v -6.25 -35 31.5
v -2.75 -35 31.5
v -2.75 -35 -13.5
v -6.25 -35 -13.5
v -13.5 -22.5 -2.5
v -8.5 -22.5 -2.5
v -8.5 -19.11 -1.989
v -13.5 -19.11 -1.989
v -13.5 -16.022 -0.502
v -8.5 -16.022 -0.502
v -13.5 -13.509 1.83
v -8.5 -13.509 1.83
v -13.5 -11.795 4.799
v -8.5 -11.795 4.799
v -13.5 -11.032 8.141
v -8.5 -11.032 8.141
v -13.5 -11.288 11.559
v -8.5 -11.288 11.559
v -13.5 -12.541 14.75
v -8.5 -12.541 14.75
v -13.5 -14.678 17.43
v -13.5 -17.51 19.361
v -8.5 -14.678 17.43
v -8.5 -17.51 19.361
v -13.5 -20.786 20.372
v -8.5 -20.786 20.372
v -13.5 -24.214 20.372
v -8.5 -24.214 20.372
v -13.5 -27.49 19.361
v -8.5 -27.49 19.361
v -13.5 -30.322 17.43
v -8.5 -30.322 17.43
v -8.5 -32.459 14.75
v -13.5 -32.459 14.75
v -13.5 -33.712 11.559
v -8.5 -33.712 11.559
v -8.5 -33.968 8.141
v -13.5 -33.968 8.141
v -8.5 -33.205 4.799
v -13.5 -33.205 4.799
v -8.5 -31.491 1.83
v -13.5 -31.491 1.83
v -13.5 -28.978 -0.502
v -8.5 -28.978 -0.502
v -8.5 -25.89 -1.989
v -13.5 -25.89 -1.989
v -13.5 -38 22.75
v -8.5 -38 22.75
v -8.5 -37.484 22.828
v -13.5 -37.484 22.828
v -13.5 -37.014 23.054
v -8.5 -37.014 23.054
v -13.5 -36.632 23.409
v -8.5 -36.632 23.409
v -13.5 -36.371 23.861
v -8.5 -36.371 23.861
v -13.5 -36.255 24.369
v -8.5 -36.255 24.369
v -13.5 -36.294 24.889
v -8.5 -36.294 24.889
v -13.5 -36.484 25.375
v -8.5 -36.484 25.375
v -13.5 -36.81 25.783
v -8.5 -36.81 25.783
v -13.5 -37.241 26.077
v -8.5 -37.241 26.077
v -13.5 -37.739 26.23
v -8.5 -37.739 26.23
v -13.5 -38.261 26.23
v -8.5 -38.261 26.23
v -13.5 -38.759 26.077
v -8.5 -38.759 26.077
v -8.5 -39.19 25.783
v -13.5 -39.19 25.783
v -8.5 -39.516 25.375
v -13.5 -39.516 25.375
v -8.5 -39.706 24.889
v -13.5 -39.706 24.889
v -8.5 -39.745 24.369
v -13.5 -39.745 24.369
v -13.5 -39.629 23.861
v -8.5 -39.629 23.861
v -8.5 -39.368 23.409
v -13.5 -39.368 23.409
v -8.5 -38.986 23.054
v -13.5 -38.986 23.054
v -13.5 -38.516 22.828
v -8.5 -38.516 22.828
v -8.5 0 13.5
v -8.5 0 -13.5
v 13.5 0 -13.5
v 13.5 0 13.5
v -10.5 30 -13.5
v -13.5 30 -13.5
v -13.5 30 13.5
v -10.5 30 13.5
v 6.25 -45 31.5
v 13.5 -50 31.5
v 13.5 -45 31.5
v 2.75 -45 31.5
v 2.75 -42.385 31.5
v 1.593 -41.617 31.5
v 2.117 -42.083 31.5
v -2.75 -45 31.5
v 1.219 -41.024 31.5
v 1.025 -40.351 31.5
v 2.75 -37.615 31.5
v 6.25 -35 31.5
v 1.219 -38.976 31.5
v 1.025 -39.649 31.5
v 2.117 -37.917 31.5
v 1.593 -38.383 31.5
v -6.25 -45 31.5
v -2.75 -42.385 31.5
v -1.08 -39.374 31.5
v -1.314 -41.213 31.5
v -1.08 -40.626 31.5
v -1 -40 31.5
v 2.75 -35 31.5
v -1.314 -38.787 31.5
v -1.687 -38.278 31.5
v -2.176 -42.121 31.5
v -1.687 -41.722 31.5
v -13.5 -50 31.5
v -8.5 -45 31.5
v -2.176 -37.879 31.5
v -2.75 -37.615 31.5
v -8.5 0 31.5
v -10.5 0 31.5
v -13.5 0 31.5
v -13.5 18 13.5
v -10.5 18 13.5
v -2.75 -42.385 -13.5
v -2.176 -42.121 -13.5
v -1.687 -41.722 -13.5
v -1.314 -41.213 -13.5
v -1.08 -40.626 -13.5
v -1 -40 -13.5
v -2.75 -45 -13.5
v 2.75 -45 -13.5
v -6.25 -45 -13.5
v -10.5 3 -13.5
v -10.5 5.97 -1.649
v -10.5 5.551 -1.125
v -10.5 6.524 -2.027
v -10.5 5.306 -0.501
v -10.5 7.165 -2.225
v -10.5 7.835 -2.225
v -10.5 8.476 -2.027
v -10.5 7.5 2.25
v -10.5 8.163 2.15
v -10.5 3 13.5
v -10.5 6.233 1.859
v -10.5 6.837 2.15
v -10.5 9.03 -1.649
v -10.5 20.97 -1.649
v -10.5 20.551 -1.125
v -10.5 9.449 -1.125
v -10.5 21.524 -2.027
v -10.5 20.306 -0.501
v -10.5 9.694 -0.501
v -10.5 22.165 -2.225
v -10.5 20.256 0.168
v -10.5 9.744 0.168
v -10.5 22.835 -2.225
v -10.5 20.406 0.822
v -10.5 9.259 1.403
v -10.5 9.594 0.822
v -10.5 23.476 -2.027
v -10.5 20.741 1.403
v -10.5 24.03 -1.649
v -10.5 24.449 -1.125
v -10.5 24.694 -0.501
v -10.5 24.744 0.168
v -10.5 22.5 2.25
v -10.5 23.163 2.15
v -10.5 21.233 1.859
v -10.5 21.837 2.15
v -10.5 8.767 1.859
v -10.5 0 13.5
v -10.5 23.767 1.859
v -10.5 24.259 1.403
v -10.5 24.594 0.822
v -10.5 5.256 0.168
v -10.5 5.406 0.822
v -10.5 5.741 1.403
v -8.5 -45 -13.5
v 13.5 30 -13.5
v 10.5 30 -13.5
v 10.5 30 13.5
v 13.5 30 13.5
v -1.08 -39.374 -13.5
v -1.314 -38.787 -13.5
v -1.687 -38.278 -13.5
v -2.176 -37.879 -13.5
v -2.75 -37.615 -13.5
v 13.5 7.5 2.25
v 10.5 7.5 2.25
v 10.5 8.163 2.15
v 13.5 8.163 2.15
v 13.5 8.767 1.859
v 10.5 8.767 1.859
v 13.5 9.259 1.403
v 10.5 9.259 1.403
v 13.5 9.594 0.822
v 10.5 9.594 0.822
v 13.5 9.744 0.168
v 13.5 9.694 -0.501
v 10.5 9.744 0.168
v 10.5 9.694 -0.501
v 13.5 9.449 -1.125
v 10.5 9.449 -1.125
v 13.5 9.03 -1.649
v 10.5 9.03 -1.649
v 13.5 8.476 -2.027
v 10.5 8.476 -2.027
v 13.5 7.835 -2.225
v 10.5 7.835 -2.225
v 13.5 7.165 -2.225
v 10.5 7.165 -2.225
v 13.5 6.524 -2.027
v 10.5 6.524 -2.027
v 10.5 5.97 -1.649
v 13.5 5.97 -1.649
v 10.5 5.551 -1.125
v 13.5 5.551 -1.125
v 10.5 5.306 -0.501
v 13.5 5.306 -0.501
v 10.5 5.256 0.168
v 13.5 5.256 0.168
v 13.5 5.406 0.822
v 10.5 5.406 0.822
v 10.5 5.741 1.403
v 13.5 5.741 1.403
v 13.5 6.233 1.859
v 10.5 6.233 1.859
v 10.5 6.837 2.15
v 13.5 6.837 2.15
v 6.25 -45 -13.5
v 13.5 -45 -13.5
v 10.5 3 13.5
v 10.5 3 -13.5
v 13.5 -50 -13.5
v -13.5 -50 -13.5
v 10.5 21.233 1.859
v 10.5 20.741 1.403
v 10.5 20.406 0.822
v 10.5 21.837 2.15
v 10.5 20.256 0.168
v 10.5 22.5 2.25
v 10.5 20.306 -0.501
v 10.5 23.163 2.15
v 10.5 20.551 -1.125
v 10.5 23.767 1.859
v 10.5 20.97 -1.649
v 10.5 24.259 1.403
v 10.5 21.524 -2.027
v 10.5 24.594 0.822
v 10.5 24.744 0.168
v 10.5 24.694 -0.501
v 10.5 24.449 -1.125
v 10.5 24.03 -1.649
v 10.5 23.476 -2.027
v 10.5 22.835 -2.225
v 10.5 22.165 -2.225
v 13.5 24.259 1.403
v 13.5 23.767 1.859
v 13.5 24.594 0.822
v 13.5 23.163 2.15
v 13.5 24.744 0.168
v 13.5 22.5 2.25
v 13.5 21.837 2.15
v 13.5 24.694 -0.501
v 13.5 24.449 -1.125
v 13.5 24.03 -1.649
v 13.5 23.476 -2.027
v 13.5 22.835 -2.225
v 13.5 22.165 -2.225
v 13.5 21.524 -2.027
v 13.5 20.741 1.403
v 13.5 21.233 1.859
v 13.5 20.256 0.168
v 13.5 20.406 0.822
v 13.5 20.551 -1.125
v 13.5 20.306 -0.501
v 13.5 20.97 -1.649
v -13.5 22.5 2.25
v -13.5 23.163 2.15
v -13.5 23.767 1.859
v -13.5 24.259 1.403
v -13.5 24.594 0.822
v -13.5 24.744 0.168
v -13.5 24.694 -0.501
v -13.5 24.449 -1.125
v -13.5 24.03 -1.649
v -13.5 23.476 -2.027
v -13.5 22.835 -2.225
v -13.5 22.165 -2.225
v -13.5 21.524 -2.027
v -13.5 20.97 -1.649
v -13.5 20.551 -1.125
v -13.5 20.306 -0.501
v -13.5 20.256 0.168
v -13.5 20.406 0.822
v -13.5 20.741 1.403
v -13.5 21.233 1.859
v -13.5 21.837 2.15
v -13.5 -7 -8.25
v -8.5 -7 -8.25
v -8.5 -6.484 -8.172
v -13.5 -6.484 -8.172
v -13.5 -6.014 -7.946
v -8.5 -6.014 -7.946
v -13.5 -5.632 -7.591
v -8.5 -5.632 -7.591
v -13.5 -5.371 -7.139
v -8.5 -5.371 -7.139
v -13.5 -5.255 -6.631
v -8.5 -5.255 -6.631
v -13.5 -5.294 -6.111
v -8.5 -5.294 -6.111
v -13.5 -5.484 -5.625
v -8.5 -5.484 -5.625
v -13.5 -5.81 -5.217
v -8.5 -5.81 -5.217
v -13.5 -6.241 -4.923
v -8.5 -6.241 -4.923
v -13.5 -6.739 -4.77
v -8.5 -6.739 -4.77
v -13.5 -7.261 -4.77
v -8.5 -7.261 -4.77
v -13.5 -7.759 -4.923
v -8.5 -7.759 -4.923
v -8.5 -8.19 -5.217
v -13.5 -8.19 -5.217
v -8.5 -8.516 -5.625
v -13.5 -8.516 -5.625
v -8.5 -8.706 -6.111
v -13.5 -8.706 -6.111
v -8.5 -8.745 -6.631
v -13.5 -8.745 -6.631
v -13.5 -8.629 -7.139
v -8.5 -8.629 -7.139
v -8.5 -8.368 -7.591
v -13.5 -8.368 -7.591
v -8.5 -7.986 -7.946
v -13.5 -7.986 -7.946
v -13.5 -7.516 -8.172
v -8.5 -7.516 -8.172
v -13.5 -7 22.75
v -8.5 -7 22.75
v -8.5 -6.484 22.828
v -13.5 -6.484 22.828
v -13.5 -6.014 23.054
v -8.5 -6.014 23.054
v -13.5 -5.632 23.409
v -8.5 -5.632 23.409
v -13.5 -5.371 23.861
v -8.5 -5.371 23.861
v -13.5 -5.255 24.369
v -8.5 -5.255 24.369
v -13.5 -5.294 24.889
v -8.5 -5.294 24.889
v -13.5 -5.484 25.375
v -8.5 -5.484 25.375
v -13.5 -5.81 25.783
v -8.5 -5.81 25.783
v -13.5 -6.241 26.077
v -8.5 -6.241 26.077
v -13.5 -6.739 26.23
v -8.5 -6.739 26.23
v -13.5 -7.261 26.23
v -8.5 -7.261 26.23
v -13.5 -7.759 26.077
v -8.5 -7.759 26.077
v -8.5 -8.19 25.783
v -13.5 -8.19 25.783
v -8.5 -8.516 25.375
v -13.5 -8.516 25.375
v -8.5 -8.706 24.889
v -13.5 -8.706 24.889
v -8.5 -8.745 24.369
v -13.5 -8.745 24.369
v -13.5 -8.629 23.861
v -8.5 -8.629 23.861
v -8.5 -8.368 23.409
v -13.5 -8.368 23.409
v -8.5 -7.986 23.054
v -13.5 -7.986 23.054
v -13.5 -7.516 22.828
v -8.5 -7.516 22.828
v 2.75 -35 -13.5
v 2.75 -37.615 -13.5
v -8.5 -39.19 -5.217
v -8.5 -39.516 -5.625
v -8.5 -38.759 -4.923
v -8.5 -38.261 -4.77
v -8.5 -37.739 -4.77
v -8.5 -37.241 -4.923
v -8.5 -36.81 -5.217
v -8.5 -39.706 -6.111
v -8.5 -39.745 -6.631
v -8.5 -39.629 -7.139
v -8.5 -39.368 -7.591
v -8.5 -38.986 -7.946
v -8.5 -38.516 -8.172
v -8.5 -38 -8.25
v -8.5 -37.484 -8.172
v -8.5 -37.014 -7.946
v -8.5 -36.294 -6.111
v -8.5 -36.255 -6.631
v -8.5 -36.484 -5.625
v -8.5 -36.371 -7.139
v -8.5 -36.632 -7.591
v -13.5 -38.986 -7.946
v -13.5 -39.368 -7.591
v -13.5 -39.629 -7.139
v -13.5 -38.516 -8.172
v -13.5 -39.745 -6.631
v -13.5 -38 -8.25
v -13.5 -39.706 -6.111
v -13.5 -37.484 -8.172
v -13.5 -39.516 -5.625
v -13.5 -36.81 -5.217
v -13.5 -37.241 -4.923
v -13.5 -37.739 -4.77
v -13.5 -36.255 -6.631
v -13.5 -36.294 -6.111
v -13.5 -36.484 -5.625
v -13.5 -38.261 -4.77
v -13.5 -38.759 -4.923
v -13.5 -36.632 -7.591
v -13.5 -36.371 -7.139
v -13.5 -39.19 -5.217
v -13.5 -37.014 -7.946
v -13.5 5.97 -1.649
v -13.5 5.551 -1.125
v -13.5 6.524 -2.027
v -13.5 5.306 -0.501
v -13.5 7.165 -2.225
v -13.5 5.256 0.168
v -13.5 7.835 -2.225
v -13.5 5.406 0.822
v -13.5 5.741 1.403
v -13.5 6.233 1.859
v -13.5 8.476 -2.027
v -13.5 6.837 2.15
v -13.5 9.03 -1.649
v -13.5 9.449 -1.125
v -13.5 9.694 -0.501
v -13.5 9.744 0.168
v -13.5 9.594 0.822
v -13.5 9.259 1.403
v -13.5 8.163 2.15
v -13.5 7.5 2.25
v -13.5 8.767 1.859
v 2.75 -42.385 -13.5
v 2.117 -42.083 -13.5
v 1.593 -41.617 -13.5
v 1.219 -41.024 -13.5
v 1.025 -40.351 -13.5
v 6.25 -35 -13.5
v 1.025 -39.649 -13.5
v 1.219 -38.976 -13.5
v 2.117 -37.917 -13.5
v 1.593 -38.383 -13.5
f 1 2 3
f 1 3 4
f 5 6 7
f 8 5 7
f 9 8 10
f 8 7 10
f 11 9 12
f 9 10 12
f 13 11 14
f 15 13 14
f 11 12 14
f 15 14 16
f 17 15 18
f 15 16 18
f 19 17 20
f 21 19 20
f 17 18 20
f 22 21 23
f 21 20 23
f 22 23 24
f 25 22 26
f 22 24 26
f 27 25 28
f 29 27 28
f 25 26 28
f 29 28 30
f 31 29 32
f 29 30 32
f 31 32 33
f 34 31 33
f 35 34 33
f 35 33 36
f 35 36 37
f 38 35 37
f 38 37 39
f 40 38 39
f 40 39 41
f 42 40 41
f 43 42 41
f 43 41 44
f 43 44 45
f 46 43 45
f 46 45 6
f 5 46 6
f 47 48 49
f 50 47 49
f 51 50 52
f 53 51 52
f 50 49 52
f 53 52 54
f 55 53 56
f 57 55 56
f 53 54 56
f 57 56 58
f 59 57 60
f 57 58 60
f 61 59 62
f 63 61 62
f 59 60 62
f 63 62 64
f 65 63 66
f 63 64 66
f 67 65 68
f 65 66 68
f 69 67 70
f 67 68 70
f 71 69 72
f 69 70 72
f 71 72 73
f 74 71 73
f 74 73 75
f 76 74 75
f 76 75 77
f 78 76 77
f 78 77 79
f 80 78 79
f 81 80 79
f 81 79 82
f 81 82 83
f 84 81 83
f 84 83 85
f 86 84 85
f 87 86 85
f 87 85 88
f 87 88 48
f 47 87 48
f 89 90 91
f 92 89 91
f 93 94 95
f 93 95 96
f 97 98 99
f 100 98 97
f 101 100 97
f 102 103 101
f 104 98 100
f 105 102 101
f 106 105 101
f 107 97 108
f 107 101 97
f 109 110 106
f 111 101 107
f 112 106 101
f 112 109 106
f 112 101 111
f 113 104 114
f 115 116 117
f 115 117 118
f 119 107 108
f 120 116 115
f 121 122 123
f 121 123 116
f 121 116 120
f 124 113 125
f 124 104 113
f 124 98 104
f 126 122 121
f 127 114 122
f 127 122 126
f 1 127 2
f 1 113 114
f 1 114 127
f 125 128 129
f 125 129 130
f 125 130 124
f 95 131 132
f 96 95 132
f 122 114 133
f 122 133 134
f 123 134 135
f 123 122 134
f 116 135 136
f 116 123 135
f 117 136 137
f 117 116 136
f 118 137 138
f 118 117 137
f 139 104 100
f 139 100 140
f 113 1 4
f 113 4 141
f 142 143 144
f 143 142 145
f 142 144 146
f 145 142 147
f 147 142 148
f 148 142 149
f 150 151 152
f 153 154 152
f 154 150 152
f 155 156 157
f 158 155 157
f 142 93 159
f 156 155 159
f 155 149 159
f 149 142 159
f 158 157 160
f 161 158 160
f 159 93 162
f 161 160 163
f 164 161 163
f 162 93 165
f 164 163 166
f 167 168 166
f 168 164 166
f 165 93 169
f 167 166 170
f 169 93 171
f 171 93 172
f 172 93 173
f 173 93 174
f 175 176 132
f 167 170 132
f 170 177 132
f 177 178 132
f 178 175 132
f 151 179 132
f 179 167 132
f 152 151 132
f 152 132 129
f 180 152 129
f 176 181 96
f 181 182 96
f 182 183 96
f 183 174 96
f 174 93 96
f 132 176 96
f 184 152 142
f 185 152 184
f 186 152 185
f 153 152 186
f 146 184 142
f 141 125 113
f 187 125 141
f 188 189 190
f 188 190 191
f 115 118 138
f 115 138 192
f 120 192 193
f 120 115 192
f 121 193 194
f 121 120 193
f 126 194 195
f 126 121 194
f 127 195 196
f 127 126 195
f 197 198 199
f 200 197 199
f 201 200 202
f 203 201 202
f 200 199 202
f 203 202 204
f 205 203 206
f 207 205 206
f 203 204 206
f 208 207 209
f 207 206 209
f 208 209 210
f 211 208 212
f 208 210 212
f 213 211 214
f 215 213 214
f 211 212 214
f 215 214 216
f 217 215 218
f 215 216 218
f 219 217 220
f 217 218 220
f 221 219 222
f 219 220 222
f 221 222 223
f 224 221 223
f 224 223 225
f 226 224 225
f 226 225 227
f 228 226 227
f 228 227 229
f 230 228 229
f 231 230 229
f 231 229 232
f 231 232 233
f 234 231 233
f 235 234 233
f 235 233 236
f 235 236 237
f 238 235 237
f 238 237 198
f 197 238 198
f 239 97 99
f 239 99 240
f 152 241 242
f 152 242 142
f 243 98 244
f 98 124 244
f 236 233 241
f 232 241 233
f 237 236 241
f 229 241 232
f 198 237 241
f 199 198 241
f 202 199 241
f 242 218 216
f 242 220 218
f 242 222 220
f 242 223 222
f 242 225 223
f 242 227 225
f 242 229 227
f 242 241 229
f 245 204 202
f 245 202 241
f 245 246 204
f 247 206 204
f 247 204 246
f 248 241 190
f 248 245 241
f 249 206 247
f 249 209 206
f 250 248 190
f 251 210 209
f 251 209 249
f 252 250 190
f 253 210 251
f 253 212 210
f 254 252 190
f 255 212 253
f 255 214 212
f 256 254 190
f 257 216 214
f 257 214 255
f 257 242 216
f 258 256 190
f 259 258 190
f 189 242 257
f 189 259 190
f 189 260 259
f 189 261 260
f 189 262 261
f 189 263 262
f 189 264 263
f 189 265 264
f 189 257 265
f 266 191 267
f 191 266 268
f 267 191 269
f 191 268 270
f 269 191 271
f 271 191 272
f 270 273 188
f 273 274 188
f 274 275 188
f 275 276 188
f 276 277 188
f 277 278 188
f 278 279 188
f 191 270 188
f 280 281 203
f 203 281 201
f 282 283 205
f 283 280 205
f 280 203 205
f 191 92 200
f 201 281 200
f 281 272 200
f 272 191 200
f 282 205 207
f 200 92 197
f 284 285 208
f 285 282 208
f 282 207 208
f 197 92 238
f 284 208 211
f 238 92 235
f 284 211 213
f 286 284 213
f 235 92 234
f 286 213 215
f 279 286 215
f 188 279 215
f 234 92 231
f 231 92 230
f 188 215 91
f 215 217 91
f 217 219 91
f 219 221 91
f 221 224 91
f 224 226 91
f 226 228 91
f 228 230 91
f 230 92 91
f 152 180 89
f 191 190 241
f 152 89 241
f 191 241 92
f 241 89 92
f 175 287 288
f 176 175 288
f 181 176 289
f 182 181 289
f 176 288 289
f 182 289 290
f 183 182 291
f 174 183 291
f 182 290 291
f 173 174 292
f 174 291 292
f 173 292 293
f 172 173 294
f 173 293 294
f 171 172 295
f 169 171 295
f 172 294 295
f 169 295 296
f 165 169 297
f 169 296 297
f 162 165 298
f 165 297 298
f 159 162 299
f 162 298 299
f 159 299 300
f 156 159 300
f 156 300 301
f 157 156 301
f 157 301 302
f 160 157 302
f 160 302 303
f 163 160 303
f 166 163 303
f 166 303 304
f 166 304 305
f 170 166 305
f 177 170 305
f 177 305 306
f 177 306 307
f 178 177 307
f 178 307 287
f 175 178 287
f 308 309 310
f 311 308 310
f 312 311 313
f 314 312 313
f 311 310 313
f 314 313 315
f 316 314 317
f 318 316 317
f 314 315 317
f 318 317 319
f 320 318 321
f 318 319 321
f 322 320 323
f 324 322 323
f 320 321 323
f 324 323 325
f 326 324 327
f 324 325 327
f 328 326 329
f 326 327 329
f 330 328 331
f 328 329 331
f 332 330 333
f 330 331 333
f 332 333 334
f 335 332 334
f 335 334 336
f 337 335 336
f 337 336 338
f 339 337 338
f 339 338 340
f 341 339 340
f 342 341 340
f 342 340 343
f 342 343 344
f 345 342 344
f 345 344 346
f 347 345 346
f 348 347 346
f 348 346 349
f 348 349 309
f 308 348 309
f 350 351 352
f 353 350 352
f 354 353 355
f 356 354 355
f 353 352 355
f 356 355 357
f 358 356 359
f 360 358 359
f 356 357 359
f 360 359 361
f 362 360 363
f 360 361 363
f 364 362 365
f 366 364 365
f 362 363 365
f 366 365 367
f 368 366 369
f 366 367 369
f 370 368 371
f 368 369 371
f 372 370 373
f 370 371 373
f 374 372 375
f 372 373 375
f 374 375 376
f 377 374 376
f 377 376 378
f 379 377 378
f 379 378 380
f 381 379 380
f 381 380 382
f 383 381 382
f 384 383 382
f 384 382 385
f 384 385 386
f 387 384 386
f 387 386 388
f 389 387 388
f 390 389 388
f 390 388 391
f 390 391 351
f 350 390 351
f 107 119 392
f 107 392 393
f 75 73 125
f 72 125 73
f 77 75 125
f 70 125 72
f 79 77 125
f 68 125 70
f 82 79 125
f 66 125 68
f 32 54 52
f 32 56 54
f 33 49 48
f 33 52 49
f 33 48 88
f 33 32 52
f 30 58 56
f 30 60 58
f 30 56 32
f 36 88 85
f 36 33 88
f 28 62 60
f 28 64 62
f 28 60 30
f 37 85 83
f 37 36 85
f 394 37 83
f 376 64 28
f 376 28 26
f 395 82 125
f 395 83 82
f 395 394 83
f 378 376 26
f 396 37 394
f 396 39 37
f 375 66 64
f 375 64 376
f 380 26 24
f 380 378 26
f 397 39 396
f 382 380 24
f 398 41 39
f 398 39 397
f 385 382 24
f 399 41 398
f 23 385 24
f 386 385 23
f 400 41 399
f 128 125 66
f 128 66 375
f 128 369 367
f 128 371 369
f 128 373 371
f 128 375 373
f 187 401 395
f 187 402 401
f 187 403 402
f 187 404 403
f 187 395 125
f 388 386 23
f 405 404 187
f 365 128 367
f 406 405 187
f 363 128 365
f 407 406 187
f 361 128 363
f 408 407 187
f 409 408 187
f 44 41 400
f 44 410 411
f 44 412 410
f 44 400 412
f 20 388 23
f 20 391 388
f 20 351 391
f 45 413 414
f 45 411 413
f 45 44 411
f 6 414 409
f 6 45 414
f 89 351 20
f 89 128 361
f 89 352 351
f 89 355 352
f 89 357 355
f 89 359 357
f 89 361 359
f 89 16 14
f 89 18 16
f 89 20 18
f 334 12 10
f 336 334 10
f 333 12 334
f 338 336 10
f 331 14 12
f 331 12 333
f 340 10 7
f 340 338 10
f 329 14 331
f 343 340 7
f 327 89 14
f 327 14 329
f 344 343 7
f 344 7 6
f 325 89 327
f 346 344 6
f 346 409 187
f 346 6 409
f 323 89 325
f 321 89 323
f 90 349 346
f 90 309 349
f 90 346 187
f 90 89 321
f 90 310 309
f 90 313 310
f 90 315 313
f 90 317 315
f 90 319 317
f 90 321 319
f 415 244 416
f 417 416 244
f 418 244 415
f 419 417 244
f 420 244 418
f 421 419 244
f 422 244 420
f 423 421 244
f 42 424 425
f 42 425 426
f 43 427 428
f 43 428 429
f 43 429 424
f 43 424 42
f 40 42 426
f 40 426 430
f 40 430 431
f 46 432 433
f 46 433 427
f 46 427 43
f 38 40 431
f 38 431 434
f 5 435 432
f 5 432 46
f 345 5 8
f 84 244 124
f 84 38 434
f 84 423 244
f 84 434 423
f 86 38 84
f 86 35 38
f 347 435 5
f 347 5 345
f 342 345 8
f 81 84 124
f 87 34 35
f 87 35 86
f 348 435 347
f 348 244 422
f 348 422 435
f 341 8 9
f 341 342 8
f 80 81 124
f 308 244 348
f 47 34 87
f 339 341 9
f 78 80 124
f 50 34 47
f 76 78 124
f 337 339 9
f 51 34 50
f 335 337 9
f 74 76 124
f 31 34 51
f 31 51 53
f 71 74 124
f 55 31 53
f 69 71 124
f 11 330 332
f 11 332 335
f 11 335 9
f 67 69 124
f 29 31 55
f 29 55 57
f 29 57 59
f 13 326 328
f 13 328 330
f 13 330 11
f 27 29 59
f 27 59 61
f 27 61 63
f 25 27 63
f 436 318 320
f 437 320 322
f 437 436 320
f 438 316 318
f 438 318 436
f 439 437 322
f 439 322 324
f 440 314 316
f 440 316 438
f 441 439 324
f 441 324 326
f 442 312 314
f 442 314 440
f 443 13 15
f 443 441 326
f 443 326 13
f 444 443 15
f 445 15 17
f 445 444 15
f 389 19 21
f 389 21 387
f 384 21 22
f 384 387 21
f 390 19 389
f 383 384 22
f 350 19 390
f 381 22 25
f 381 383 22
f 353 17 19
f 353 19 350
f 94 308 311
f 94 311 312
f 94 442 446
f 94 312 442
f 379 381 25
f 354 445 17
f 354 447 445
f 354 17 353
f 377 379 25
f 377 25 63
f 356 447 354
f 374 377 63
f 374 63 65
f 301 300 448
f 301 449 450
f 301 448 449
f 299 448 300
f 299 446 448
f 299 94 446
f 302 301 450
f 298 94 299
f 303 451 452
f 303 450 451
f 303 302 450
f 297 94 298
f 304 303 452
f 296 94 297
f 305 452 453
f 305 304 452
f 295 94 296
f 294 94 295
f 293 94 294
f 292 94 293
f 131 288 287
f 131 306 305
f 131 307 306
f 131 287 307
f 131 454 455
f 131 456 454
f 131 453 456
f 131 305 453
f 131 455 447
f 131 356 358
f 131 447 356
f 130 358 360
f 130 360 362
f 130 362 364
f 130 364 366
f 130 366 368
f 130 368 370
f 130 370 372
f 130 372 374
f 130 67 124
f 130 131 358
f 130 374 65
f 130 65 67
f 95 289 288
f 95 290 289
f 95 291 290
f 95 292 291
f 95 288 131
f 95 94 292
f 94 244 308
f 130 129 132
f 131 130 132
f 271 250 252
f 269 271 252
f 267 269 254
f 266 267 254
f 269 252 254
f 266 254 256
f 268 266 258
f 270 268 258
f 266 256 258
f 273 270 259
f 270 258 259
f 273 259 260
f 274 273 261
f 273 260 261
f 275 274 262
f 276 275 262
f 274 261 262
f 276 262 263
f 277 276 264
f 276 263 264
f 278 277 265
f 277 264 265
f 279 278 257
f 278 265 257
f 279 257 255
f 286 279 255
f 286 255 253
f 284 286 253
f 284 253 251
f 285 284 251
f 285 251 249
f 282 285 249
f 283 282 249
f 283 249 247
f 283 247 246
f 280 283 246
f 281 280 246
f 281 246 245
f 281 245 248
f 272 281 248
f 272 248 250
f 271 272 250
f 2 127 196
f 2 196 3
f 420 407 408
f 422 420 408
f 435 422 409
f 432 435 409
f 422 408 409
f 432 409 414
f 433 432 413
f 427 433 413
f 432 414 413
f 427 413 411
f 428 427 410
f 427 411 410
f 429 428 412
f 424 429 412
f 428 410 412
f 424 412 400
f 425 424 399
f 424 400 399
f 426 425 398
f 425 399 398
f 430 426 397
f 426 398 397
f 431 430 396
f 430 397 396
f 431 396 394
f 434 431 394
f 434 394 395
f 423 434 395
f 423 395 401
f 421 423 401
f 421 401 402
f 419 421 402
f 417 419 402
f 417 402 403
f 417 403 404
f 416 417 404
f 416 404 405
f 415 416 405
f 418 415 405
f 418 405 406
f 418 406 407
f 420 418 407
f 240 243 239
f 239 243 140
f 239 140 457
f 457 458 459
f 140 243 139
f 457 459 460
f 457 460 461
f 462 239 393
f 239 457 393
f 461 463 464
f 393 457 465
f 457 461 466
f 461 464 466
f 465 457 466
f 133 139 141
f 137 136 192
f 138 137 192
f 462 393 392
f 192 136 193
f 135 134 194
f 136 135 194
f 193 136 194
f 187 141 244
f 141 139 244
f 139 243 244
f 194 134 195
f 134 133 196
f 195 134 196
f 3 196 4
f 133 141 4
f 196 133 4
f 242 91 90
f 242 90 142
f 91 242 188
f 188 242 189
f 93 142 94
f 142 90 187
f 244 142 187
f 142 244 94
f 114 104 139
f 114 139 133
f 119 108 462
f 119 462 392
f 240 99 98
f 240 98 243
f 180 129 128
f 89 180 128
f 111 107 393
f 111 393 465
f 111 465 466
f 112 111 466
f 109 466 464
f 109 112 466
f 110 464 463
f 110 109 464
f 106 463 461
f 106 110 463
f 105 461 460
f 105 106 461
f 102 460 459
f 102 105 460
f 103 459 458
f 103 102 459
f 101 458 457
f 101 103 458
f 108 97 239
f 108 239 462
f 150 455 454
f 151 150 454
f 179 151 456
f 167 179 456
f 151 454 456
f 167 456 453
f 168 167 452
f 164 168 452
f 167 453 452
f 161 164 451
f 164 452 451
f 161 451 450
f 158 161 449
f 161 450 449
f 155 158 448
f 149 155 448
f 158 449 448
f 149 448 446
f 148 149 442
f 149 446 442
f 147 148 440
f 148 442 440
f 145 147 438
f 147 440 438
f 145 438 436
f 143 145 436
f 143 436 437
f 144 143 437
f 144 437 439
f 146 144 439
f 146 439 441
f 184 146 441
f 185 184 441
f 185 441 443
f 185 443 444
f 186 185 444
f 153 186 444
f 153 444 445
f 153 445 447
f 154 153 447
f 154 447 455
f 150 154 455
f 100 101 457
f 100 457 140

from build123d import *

# Parameters (mm, degrees)
SKETCH1_W            = 27
SKETCH1_H            = 27
BOSS_EXTRUDE1_DEPTH  = 30
SKETCH2_W            = 21
SKETCH2_H            = 27
CUT_EXTRUDE1_DEPTH   = 30
SKETCH3_R            = 2.25
CUT_EXTRUDE2_DEPTH   = 30
SKETCH5_W            = 5
SKETCH5_H            = 45
BOSS_EXTRUDE2_DEPTH  = 45
SKETCH6_R            = 1.75
SKETCH6_R_2          = 11.5
CUT_EXTRUDE3_DEPTH   = 10
SKETCH8_W            = 45
SKETCH8_H            = 5
BOSS_EXTRUDE4_DEPTH  = 5
SKETCH9_W            = 45
SKETCH9_H            = 5
BOSS_EXTRUDE5_DEPTH  = 22
BOSS_EXTRUDE6_DEPTH  = 45
BOSS_EXTRUDE10_START = -3
BOSS_EXTRUDE10_DEPTH = 3


with BuildPart() as part:
    # Sketch1 → Boss-Extrude1 (new body)
    with BuildSketch(Plane(origin=(0, 0, 0), x_dir=(1, 0, 0), z_dir=(0, 1, 0))):
        Rectangle(SKETCH1_W, SKETCH1_H)
    extrude(amount=BOSS_EXTRUDE1_DEPTH)

    # Sketch2 → Cut-Extrude1 (cut)
    with BuildSketch(Plane(origin=(0, 0, -13.5), x_dir=(-1, 0, 0), z_dir=(0, 0, -1))):
        with Locations((0, 16.5)):
            Rectangle(SKETCH2_W, SKETCH2_H)
    extrude(amount=-CUT_EXTRUDE1_DEPTH, mode=Mode.SUBTRACT)

    # Sketch3 → Cut-Extrude2 (cut)
    with BuildSketch(Plane.ZY.offset(13.5)):
        with Locations((0, 7.5)):
            Circle(SKETCH3_R)
        with Locations((0, 22.5)):
            Circle(SKETCH3_R)
    extrude(amount=-CUT_EXTRUDE2_DEPTH, mode=Mode.SUBTRACT)

    # Sketch5 → Boss-Extrude2 (add)
    with BuildSketch(Plane.XZ):
        with Locations((-11, 9)):
            Rectangle(SKETCH5_W, SKETCH5_H)
    extrude(amount=BOSS_EXTRUDE2_DEPTH)

    # Sketch6 → Cut-Extrude3 (cut)
    with BuildSketch(Plane(origin=(-8.5, 0, 0), x_dir=(0, 0, -1), z_dir=(1, 0, 0))):
        with Locations((-24.5, -38)):
            Circle(SKETCH6_R)
        with Locations((-24.5, -7)):
            Circle(SKETCH6_R)
        with Locations((6.5, -7)):
            Circle(SKETCH6_R)
        with Locations((6.5, -38)):
            Circle(SKETCH6_R)
        with Locations((-9, -22.5)):
            Circle(SKETCH6_R_2)
    extrude(amount=-CUT_EXTRUDE3_DEPTH, mode=Mode.SUBTRACT)

    # Sketch8 → Boss-Extrude4 (add)
    with BuildSketch(Plane(origin=(-8.5, 0, 0), x_dir=(0, 0, -1), z_dir=(1, 0, 0))):
        with Locations((-9, -47.5)):
            Rectangle(SKETCH8_W, SKETCH8_H)
    extrude(amount=-BOSS_EXTRUDE4_DEPTH)

    # Sketch9 → Boss-Extrude5 (add)
    with BuildSketch(Plane(origin=(-8.5, 0, 0), x_dir=(0, 0, -1), z_dir=(1, 0, 0))):
        with Locations((-9, -47.5)):
            Rectangle(SKETCH9_W, SKETCH9_H)
    extrude(amount=BOSS_EXTRUDE5_DEPTH)

    # Sketch10 → Boss-Extrude6 (add)
    with BuildSketch(Plane.XY.offset(31.5)):
        with BuildLine():
            Line((-6.25, -35), (-6.25, -45))
            Line((-6.25, -45), (-2.75, -45))
            Line((-2.75, -45), (-2.75, -42.384848004))
            ThreePointArc((-2.75, -42.384848004), (-6, -40), (-2.75, -37.615151996))
            Line((-2.75, -37.615151996), (-2.75, -35))
            Line((-2.75, -35), (-6.25, -35))
        make_face()
        with BuildLine():
            ThreePointArc((-2.75, -37.615151996), (-6, -40), (-2.75, -42.384848004))
            Line((-2.75, -42.384848004), (-2.75, -37.615151996))
        make_face()
        with BuildLine():
            Line((-2.75, -37.615151996), (-2.75, -42.384848004))
            ThreePointArc((-2.75, -42.384848004), (-1.484435563, -41.479019946), (-1, -40))
            ThreePointArc((-1, -40), (-1.484435563, -38.520980054), (-2.75, -37.615151996))
        make_face()
        with BuildLine():
            ThreePointArc((2.75, -37.615151996), (1, -40), (2.75, -42.384848004))
            Line((2.75, -42.384848004), (2.75, -37.615151996))
        make_face()
        with BuildLine():
            Line((2.75, -37.615151996), (2.75, -42.384848004))
            ThreePointArc((2.75, -42.384848004), (4.979019946, -42.015564437), (6, -40))
            ThreePointArc((6, -40), (4.979019946, -37.984435563), (2.75, -37.615151996))
        make_face()
        with BuildLine():
            Line((2.75, -42.384848004), (2.75, -45))
            Line((2.75, -45), (6.25, -45))
            Line((6.25, -45), (6.25, -35))
            Line((6.25, -35), (2.75, -35))
            Line((2.75, -35), (2.75, -37.615151996))
            ThreePointArc((2.75, -37.615151996), (4.979019946, -37.984435563), (6, -40))
            ThreePointArc((6, -40), (4.979019946, -42.015564437), (2.75, -42.384848004))
        make_face()
    extrude(amount=-BOSS_EXTRUDE6_DEPTH)

    # Sketch15 → Boss-Extrude10 (add)
    with BuildSketch(Plane.ZY.offset(13.5).offset(BOSS_EXTRUDE10_START)):
        Polygon((31.5, 0), (13.5, 18), (13.5, 0), align=None)
    extrude(amount=BOSS_EXTRUDE10_DEPTH)


solid = part.part
